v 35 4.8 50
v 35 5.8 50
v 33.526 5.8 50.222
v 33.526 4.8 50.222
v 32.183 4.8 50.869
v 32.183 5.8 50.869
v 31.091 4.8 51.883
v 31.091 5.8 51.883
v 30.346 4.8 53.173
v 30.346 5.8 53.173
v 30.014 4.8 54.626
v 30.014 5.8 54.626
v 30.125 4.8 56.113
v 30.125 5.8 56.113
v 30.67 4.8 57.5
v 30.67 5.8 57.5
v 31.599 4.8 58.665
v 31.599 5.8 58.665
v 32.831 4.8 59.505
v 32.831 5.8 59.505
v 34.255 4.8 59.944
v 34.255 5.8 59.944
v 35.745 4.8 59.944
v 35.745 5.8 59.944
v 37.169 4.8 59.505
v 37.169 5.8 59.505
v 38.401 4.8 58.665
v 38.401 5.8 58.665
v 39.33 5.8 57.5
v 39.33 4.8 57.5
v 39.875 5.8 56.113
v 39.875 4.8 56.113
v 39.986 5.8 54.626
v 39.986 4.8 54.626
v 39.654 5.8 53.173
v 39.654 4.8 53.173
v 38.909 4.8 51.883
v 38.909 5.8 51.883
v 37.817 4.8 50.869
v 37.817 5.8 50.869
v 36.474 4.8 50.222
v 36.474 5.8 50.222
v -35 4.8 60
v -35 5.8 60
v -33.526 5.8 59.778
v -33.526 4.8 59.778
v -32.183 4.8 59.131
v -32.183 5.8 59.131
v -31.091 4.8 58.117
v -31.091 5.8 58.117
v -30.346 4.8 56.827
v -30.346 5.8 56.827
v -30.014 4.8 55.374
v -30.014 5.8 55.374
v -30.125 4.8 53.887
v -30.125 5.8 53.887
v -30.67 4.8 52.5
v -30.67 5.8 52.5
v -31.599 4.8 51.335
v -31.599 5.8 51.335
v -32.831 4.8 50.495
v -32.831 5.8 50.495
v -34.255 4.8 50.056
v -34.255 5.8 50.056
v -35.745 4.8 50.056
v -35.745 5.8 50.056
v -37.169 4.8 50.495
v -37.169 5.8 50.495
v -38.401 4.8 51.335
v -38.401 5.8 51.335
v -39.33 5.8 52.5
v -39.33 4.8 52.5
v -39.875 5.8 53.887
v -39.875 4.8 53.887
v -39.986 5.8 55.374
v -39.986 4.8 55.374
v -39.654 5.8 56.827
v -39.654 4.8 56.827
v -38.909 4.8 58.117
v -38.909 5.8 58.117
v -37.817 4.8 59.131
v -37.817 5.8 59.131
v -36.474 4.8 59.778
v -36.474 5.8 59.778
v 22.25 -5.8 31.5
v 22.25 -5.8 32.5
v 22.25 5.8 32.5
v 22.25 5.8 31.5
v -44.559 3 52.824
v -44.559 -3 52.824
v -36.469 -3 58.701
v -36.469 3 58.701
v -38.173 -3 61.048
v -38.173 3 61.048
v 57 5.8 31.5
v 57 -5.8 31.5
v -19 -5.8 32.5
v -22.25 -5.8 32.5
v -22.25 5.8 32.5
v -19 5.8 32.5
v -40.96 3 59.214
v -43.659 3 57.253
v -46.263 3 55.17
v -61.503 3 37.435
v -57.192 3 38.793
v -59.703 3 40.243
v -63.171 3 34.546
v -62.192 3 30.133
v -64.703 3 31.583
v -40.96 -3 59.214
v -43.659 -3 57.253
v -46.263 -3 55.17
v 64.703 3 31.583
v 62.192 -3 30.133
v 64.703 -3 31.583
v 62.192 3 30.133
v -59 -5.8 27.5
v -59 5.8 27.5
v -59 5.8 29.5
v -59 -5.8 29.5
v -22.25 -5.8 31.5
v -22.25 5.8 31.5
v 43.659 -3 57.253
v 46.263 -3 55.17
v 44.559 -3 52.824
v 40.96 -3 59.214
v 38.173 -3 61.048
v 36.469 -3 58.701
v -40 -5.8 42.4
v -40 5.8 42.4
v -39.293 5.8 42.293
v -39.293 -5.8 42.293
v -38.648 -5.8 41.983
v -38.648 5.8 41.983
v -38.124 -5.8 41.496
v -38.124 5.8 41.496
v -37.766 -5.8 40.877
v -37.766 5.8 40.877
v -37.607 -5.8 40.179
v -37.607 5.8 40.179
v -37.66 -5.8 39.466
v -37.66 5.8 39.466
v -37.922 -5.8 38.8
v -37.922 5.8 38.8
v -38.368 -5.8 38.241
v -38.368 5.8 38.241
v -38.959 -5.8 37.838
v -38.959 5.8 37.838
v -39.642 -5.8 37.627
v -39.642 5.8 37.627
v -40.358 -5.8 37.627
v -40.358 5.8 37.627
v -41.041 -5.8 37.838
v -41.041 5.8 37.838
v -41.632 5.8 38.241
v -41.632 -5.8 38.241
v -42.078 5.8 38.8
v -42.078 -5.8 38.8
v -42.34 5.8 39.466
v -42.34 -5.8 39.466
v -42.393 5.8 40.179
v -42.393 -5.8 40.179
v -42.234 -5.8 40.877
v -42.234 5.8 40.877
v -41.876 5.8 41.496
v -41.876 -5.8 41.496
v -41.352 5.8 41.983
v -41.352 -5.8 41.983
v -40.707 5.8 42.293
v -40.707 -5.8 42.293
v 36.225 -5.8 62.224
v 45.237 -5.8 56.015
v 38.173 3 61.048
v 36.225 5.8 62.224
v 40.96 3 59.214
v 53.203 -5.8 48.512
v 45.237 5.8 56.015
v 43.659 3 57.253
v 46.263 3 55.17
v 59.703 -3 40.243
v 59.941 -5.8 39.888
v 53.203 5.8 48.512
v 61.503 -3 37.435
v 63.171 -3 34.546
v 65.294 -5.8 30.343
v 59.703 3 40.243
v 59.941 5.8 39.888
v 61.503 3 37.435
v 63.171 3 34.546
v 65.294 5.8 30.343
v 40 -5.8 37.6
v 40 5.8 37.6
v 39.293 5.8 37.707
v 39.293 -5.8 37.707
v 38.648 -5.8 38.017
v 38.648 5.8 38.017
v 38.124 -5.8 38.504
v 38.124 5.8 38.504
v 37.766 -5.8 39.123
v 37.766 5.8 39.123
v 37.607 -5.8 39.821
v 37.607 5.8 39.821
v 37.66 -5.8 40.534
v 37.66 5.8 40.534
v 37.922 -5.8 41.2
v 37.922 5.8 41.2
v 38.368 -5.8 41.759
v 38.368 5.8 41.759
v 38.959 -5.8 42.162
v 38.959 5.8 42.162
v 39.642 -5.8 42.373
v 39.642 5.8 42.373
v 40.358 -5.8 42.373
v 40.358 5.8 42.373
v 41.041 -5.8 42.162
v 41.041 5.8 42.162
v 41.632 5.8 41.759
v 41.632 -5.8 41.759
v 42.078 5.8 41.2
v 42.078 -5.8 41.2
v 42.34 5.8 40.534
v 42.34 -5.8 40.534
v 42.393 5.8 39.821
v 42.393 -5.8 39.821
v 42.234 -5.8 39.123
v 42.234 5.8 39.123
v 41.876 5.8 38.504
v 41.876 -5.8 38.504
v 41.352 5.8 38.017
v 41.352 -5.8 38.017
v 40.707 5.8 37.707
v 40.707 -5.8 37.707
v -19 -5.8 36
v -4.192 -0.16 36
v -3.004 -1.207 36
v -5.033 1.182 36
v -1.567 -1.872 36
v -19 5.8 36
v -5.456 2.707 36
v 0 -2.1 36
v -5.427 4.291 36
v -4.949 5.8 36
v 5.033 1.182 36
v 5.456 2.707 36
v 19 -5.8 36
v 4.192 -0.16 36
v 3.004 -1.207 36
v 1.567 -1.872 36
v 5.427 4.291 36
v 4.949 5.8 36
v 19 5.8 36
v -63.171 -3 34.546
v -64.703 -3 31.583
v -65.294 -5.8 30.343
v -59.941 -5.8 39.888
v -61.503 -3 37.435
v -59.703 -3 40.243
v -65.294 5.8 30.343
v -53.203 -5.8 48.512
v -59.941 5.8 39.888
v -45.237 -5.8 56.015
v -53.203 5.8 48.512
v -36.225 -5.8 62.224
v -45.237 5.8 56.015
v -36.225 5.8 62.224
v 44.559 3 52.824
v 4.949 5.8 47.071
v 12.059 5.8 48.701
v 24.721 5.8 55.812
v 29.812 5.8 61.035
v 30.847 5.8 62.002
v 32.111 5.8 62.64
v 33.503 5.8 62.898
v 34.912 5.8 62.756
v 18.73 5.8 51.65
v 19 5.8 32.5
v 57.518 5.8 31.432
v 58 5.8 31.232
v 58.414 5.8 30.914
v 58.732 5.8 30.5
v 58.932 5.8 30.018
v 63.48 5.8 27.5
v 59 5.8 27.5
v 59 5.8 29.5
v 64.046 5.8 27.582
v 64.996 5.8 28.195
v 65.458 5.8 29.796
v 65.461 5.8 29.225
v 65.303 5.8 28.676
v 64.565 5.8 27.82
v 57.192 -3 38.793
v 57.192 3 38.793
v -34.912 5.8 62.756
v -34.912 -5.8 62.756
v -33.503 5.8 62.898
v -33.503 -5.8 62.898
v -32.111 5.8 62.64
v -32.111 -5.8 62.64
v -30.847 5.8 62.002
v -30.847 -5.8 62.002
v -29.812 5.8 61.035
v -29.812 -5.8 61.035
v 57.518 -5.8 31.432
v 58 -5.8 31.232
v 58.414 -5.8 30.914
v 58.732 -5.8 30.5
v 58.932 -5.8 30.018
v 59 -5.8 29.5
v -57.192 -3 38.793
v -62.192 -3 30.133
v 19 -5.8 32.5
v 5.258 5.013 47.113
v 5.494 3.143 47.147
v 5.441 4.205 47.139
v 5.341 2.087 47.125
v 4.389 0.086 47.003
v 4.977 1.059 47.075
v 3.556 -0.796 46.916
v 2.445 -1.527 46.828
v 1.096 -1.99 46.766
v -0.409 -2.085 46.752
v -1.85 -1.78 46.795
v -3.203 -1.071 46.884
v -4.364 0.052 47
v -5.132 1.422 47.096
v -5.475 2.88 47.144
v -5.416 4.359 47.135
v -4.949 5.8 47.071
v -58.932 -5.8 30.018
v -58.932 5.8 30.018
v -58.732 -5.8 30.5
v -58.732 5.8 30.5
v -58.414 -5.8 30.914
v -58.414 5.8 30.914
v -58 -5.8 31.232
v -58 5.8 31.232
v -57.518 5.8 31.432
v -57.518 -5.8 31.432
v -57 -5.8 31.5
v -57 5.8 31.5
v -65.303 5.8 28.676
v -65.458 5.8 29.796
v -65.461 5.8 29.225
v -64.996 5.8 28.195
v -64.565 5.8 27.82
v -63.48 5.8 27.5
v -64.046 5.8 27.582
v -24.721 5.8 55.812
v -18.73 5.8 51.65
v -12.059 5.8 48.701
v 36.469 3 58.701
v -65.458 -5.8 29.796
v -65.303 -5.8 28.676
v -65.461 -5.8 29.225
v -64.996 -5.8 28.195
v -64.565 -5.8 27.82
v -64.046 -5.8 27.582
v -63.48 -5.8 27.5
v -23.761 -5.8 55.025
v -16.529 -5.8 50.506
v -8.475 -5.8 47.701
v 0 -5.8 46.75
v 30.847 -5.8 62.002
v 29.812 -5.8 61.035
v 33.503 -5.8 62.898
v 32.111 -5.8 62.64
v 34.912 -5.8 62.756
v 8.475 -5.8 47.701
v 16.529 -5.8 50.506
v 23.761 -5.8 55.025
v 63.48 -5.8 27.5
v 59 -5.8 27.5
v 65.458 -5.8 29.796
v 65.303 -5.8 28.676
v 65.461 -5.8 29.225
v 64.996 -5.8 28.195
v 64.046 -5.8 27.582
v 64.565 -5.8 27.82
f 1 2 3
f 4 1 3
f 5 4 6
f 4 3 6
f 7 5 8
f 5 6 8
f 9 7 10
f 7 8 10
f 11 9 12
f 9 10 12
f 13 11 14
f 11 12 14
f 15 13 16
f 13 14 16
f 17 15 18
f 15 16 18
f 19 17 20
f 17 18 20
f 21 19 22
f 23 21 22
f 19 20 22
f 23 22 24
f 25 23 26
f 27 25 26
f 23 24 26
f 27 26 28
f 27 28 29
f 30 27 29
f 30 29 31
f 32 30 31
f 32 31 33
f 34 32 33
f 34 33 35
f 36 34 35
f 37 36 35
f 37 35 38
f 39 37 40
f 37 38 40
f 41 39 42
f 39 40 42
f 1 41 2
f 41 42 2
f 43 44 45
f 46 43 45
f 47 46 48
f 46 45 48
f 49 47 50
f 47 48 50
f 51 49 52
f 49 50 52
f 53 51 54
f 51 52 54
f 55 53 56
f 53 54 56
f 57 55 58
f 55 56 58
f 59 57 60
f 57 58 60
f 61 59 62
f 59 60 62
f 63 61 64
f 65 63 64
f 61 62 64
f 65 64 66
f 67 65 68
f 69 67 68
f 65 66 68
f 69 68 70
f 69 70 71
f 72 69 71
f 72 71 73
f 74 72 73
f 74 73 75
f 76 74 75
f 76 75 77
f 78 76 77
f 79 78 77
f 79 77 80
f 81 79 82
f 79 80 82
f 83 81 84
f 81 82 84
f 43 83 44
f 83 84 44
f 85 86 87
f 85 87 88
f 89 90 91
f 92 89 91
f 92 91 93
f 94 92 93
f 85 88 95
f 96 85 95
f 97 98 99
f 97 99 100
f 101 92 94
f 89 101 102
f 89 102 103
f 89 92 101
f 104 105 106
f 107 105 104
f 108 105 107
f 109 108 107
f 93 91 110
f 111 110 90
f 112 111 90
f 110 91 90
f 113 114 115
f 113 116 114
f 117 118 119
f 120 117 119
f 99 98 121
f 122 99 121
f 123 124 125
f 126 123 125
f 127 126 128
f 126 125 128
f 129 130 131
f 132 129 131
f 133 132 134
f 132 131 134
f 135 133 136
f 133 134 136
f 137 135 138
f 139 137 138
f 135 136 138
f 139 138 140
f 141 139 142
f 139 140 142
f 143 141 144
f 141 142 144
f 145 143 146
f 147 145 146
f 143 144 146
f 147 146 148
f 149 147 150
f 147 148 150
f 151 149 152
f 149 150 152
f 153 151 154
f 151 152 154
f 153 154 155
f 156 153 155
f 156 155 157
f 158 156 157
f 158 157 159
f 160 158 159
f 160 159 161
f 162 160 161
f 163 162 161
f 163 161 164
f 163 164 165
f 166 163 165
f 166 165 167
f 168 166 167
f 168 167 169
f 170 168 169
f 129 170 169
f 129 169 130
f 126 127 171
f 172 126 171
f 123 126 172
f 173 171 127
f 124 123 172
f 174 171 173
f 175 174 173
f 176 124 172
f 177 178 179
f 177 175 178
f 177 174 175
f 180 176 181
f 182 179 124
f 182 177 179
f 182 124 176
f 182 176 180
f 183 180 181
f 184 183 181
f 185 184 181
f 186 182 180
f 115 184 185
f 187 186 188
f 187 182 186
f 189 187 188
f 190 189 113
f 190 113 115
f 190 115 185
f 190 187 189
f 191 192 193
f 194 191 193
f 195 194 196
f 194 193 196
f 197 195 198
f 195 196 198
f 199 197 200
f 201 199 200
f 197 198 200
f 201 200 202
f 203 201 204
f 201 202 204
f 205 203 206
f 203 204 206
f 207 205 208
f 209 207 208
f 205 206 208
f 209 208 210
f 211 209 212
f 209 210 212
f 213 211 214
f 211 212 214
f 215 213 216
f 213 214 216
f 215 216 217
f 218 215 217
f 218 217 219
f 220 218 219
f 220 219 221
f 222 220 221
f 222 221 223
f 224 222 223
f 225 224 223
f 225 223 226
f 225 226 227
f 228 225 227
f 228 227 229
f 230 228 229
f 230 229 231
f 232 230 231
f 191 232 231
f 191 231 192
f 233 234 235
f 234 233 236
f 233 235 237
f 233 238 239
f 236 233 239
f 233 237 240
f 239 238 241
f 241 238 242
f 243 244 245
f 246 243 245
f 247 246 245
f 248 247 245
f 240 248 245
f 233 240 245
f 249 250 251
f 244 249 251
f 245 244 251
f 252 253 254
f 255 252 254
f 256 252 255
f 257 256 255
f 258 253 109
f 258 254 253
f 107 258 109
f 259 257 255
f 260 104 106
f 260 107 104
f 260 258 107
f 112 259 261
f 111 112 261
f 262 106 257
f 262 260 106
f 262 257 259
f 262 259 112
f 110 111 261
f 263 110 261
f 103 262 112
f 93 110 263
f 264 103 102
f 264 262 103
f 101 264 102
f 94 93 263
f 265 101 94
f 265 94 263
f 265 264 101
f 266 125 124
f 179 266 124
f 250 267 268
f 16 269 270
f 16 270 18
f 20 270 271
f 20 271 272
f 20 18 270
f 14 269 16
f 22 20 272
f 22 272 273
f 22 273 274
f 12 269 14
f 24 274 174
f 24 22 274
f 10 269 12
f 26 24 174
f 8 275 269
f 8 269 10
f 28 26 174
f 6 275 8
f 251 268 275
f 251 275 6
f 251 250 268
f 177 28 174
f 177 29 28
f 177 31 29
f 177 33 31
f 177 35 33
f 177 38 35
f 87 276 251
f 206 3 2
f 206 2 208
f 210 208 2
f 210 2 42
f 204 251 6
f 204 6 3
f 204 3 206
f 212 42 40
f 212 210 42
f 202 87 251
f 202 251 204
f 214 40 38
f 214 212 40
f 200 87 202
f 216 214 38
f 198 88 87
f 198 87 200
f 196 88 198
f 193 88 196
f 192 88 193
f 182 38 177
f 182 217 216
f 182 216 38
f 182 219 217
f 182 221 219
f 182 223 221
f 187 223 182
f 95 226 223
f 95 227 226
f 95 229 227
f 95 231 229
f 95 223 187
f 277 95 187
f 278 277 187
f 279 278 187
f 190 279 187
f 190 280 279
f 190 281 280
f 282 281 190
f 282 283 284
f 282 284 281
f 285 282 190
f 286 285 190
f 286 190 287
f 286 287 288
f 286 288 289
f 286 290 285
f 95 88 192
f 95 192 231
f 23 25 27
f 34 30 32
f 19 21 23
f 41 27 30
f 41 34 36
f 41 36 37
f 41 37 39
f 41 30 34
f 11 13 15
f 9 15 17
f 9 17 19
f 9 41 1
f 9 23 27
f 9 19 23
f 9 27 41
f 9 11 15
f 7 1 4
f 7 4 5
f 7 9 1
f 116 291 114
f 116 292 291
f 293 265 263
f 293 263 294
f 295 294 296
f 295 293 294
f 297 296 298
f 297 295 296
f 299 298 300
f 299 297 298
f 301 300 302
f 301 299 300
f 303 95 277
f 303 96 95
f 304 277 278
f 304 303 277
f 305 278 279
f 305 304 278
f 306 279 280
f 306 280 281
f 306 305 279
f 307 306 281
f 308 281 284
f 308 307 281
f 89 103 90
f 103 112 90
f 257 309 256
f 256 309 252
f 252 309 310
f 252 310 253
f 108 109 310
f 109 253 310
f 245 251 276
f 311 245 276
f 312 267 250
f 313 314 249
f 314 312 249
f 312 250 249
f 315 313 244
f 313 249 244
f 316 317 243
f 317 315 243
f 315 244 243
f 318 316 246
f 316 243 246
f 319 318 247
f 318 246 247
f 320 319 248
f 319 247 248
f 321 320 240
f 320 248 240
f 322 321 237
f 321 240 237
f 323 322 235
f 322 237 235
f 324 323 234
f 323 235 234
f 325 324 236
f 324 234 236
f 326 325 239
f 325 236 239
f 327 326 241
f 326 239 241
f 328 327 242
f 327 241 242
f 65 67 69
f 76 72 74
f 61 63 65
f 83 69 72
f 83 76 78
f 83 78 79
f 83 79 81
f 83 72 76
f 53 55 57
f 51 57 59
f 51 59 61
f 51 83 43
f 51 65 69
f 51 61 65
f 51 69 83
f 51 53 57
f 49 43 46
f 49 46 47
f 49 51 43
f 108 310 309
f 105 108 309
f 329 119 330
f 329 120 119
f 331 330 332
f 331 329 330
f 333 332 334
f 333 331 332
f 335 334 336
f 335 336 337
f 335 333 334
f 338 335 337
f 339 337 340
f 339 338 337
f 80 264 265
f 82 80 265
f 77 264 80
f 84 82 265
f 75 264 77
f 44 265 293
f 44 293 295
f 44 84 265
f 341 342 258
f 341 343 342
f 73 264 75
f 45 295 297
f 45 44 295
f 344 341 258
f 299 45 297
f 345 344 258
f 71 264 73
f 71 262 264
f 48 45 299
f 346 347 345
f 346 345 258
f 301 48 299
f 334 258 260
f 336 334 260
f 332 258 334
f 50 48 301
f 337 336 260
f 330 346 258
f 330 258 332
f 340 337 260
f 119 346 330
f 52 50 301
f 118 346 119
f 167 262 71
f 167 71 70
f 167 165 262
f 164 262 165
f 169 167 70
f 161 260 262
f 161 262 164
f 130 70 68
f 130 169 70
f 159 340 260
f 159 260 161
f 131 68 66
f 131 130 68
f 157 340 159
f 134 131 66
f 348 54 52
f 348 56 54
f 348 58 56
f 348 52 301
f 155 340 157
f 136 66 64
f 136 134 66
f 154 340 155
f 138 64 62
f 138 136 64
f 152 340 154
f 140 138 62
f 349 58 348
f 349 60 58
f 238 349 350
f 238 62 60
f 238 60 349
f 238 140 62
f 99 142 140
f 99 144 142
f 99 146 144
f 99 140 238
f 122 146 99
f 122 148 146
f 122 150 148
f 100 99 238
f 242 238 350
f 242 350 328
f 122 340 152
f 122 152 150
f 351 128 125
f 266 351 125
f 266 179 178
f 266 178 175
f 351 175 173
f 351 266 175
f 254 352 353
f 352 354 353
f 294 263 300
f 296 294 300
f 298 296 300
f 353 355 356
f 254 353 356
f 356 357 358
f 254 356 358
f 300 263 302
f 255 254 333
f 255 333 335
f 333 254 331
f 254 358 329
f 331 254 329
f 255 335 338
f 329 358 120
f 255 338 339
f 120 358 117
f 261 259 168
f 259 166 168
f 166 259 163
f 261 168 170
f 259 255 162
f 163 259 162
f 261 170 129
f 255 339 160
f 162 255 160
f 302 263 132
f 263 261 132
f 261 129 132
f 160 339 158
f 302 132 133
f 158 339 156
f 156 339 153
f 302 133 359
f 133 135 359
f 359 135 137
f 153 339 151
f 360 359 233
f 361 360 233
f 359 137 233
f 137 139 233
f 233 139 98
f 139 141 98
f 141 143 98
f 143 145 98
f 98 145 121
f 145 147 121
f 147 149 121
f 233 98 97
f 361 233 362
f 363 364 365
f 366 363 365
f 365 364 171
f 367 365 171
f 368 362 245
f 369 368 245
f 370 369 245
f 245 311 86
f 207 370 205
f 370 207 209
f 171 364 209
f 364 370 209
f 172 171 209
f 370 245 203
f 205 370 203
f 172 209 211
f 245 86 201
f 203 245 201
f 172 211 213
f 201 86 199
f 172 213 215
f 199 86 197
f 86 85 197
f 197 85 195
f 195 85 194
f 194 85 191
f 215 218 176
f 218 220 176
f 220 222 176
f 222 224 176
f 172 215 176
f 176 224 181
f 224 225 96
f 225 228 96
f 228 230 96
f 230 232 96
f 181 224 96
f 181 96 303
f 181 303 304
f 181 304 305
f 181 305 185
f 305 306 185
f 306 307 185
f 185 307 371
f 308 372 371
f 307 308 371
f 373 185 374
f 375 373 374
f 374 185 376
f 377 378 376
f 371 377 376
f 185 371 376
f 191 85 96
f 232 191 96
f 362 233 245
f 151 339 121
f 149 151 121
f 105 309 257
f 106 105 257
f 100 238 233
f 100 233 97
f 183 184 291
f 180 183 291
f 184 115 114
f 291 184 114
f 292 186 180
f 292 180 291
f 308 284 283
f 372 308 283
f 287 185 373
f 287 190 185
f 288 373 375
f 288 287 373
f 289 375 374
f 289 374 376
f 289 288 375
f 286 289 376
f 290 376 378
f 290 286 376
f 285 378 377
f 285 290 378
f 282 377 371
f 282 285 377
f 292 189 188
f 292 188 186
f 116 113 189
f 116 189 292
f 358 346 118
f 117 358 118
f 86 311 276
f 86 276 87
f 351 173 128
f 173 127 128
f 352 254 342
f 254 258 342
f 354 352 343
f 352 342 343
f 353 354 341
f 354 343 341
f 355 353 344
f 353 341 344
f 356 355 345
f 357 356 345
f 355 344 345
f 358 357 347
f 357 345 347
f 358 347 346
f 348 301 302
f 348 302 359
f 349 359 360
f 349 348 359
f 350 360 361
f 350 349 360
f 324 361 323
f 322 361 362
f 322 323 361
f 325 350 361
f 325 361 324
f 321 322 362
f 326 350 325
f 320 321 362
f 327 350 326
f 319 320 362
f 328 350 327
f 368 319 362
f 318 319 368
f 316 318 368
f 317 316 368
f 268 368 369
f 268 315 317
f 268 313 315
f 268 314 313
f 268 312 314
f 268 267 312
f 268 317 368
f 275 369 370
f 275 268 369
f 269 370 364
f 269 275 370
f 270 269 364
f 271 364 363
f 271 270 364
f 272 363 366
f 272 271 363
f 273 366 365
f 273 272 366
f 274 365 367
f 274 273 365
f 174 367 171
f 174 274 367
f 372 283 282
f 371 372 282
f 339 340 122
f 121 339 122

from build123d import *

# Parameters (mm, degrees)
BOSS_EXTRUDE1_DEPTH  = 5.8
SOLENOID_PLACEMENT_W = 38
SOLENOID_PLACEMENT_H = 64
CUT_EXTRUDE1_DEPTH   = 103.481998419
SKETCH6_R            = 2.4
CUT_EXTRUDE6_DEPTH   = 103.481998419
CUT_EXTRUDE3_DEPTH   = 103.481998419
FILLET1_R            = 2
CUT_EXTRUDE7_DEPTH   = 3
SKETCH11_R           = 5.5
CUT_EXTRUDE8_DEPTH   = 72.028583754
SKETCH12_W           = 44.5
SKETCH12_H           = 65
CUT_EXTRUDE9_DEPTH   = 92.53668667
SKETCH13_R           = 5
CUT_EXTRUDE10_DEPTH  = 1


with BuildPart() as part:
    # Sketch1 → Boss-Extrude1 (new, symmetric)
    with BuildSketch(Plane(origin=(0, 0, 0), x_dir=(1, 0, 0), z_dir=(0, 1, 0))):
        with BuildLine():
            ThreePointArc((36.224522061, -62.223661106), (0, 72), (-36.224522061, -62.223661106))
            ThreePointArc((-36.224522061, -62.223661106), (-32.797800029, -62.818856853), (-29.811944095, -61.035223988))
            ThreePointArc((-29.811944095, -61.035223988), (0, -46.75), (29.811944095, -61.035223988))
            ThreePointArc((29.811944095, -61.035223988), (32.797800029, -62.818856853), (36.224522061, -62.223661106))
        make_face()
    extrude(amount=BOSS_EXTRUDE1_DEPTH, both=True)

    # solenoid placement → Cut-Extrude1 (cut, through all)
    with BuildSketch(Plane(origin=(0, 5.8, 0), x_dir=(1, 0, 0), z_dir=(0, 1, 0))):
        with Locations((0, -4)):
            Rectangle(SOLENOID_PLACEMENT_W, SOLENOID_PLACEMENT_H)
    extrude(amount=-CUT_EXTRUDE1_DEPTH, mode=Mode.SUBTRACT)

    # Sketch6 → Cut-Extrude6 (cut, through all)
    with BuildSketch(Plane(origin=(0, 5.8, 0), x_dir=(1, 0, 0), z_dir=(0, 1, 0))):
        with Locations(Location((40, -40, 0), (0, 0, 90))):
            Circle(SKETCH6_R)
        with Locations(Location((-40, -40, 0), (0, 0, 270))):
            Circle(SKETCH6_R)
    extrude(amount=-CUT_EXTRUDE6_DEPTH, mode=Mode.SUBTRACT)

    # Sketch3 → Cut-Extrude3 (cut, through all)
    with BuildSketch(Plane(origin=(0, 5.8, 0), x_dir=(1, 0, 0), z_dir=(0, 1, 0))):
        Polygon((-72, -27.5), (-59, -27.5), (-59, -31.5), (59, -31.5), (59, -27.5), (72, -27.5), (72, 31.5), (72, 72), (-72, 72), (-72, 31.5), align=None)
    extrude(amount=-CUT_EXTRUDE3_DEPTH, mode=Mode.SUBTRACT)

    # Fillet1
    fillet1_edges = [part.edges().sort_by_distance(p)[0] for p in [
        (66.541340534, 0, 27.5),
        (-66.541340534, 0, 27.5),
        (59, 0, 31.5),
        (-59, 0, 31.5),
    ]]
    fillet(fillet1_edges, radius=FILLET1_R)

    # Sketch9 → Cut-Extrude7 (cut, symmetric)
    with BuildSketch(Plane(origin=(0, 0, 0), x_dir=(1, 0, 0), z_dir=(0, 1, 0))):
        with BuildLine():
            Line((-64.703295733, -31.582962517), (-62.191822062, -30.132962517))
            Line((-62.191822062, -30.132962517), (-57.191822062, -38.793216555))
            Line((-57.191822062, -38.793216555), (-59.703295733, -40.243216555))
            ThreePointArc((-59.703295733, -40.243216555), (-62.353829072, -36), (-64.703295733, -31.582962517))
        make_face()
        with BuildLine():
            Line((-46.263453759, -55.169673248), (-44.558876527, -52.823523965))
            Line((-44.558876527, -52.823523965), (-36.468706583, -58.701376488))
            Line((-36.468706583, -58.701376488), (-38.173283815, -61.047525771))
            ThreePointArc((-38.173283815, -61.047525771), (-42.320538165, -58.249223595), (-46.263453759, -55.169673248))
        make_face()
        with BuildLine():
            Line((38.173283815, -61.047525771), (36.468706583, -58.701376488))
            Line((36.468706583, -58.701376488), (44.558876527, -52.823523965))
            Line((44.558876527, -52.823523965), (46.263453759, -55.169673248))
            ThreePointArc((46.263453759, -55.169673248), (42.320538165, -58.249223595), (38.173283815, -61.047525771))
        make_face()
        with BuildLine():
            Line((59.703295733, -40.243216555), (57.191822062, -38.793216555))
            Line((57.191822062, -38.793216555), (62.191822062, -30.132962517))
            Line((62.191822062, -30.132962517), (64.703295733, -31.582962517))
            ThreePointArc((64.703295733, -31.582962517), (62.353829072, -36), (59.703295733, -40.243216555))
        make_face()
    extrude(amount=CUT_EXTRUDE7_DEPTH, both=True, mode=Mode.SUBTRACT)

    # Sketch11 → Cut-Extrude8 (cut, through all)
    with BuildSketch(Plane(origin=(0, 0, 36), x_dir=(-1, 0, 0), z_dir=(0, 0, -1))):
        with Locations((0, 3.4)):
            Circle(SKETCH11_R)
    extrude(amount=-CUT_EXTRUDE8_DEPTH, mode=Mode.SUBTRACT)

    # Sketch12 → Cut-Extrude9 (cut, through all)
    with BuildSketch(Plane(origin=(0, 5.8, 0), x_dir=(1, 0, 0), z_dir=(0, 1, 0))):
        Rectangle(SKETCH12_W, SKETCH12_H)
    extrude(amount=-CUT_EXTRUDE9_DEPTH, mode=Mode.SUBTRACT)

    # Sketch13 → Cut-Extrude10 (cut)
    with BuildSketch(Plane(origin=(0, 5.8, 0), x_dir=(1, 0, 0), z_dir=(0, 1, 0))):
        with Locations(Location((-35, -55, 0), (0, 0, 270))):
            Circle(SKETCH13_R)
        with Locations(Location((35, -55, 0), (0, 0, 90))):
            Circle(SKETCH13_R)
    extrude(amount=-CUT_EXTRUDE10_DEPTH, mode=Mode.SUBTRACT)


solid = part.part
